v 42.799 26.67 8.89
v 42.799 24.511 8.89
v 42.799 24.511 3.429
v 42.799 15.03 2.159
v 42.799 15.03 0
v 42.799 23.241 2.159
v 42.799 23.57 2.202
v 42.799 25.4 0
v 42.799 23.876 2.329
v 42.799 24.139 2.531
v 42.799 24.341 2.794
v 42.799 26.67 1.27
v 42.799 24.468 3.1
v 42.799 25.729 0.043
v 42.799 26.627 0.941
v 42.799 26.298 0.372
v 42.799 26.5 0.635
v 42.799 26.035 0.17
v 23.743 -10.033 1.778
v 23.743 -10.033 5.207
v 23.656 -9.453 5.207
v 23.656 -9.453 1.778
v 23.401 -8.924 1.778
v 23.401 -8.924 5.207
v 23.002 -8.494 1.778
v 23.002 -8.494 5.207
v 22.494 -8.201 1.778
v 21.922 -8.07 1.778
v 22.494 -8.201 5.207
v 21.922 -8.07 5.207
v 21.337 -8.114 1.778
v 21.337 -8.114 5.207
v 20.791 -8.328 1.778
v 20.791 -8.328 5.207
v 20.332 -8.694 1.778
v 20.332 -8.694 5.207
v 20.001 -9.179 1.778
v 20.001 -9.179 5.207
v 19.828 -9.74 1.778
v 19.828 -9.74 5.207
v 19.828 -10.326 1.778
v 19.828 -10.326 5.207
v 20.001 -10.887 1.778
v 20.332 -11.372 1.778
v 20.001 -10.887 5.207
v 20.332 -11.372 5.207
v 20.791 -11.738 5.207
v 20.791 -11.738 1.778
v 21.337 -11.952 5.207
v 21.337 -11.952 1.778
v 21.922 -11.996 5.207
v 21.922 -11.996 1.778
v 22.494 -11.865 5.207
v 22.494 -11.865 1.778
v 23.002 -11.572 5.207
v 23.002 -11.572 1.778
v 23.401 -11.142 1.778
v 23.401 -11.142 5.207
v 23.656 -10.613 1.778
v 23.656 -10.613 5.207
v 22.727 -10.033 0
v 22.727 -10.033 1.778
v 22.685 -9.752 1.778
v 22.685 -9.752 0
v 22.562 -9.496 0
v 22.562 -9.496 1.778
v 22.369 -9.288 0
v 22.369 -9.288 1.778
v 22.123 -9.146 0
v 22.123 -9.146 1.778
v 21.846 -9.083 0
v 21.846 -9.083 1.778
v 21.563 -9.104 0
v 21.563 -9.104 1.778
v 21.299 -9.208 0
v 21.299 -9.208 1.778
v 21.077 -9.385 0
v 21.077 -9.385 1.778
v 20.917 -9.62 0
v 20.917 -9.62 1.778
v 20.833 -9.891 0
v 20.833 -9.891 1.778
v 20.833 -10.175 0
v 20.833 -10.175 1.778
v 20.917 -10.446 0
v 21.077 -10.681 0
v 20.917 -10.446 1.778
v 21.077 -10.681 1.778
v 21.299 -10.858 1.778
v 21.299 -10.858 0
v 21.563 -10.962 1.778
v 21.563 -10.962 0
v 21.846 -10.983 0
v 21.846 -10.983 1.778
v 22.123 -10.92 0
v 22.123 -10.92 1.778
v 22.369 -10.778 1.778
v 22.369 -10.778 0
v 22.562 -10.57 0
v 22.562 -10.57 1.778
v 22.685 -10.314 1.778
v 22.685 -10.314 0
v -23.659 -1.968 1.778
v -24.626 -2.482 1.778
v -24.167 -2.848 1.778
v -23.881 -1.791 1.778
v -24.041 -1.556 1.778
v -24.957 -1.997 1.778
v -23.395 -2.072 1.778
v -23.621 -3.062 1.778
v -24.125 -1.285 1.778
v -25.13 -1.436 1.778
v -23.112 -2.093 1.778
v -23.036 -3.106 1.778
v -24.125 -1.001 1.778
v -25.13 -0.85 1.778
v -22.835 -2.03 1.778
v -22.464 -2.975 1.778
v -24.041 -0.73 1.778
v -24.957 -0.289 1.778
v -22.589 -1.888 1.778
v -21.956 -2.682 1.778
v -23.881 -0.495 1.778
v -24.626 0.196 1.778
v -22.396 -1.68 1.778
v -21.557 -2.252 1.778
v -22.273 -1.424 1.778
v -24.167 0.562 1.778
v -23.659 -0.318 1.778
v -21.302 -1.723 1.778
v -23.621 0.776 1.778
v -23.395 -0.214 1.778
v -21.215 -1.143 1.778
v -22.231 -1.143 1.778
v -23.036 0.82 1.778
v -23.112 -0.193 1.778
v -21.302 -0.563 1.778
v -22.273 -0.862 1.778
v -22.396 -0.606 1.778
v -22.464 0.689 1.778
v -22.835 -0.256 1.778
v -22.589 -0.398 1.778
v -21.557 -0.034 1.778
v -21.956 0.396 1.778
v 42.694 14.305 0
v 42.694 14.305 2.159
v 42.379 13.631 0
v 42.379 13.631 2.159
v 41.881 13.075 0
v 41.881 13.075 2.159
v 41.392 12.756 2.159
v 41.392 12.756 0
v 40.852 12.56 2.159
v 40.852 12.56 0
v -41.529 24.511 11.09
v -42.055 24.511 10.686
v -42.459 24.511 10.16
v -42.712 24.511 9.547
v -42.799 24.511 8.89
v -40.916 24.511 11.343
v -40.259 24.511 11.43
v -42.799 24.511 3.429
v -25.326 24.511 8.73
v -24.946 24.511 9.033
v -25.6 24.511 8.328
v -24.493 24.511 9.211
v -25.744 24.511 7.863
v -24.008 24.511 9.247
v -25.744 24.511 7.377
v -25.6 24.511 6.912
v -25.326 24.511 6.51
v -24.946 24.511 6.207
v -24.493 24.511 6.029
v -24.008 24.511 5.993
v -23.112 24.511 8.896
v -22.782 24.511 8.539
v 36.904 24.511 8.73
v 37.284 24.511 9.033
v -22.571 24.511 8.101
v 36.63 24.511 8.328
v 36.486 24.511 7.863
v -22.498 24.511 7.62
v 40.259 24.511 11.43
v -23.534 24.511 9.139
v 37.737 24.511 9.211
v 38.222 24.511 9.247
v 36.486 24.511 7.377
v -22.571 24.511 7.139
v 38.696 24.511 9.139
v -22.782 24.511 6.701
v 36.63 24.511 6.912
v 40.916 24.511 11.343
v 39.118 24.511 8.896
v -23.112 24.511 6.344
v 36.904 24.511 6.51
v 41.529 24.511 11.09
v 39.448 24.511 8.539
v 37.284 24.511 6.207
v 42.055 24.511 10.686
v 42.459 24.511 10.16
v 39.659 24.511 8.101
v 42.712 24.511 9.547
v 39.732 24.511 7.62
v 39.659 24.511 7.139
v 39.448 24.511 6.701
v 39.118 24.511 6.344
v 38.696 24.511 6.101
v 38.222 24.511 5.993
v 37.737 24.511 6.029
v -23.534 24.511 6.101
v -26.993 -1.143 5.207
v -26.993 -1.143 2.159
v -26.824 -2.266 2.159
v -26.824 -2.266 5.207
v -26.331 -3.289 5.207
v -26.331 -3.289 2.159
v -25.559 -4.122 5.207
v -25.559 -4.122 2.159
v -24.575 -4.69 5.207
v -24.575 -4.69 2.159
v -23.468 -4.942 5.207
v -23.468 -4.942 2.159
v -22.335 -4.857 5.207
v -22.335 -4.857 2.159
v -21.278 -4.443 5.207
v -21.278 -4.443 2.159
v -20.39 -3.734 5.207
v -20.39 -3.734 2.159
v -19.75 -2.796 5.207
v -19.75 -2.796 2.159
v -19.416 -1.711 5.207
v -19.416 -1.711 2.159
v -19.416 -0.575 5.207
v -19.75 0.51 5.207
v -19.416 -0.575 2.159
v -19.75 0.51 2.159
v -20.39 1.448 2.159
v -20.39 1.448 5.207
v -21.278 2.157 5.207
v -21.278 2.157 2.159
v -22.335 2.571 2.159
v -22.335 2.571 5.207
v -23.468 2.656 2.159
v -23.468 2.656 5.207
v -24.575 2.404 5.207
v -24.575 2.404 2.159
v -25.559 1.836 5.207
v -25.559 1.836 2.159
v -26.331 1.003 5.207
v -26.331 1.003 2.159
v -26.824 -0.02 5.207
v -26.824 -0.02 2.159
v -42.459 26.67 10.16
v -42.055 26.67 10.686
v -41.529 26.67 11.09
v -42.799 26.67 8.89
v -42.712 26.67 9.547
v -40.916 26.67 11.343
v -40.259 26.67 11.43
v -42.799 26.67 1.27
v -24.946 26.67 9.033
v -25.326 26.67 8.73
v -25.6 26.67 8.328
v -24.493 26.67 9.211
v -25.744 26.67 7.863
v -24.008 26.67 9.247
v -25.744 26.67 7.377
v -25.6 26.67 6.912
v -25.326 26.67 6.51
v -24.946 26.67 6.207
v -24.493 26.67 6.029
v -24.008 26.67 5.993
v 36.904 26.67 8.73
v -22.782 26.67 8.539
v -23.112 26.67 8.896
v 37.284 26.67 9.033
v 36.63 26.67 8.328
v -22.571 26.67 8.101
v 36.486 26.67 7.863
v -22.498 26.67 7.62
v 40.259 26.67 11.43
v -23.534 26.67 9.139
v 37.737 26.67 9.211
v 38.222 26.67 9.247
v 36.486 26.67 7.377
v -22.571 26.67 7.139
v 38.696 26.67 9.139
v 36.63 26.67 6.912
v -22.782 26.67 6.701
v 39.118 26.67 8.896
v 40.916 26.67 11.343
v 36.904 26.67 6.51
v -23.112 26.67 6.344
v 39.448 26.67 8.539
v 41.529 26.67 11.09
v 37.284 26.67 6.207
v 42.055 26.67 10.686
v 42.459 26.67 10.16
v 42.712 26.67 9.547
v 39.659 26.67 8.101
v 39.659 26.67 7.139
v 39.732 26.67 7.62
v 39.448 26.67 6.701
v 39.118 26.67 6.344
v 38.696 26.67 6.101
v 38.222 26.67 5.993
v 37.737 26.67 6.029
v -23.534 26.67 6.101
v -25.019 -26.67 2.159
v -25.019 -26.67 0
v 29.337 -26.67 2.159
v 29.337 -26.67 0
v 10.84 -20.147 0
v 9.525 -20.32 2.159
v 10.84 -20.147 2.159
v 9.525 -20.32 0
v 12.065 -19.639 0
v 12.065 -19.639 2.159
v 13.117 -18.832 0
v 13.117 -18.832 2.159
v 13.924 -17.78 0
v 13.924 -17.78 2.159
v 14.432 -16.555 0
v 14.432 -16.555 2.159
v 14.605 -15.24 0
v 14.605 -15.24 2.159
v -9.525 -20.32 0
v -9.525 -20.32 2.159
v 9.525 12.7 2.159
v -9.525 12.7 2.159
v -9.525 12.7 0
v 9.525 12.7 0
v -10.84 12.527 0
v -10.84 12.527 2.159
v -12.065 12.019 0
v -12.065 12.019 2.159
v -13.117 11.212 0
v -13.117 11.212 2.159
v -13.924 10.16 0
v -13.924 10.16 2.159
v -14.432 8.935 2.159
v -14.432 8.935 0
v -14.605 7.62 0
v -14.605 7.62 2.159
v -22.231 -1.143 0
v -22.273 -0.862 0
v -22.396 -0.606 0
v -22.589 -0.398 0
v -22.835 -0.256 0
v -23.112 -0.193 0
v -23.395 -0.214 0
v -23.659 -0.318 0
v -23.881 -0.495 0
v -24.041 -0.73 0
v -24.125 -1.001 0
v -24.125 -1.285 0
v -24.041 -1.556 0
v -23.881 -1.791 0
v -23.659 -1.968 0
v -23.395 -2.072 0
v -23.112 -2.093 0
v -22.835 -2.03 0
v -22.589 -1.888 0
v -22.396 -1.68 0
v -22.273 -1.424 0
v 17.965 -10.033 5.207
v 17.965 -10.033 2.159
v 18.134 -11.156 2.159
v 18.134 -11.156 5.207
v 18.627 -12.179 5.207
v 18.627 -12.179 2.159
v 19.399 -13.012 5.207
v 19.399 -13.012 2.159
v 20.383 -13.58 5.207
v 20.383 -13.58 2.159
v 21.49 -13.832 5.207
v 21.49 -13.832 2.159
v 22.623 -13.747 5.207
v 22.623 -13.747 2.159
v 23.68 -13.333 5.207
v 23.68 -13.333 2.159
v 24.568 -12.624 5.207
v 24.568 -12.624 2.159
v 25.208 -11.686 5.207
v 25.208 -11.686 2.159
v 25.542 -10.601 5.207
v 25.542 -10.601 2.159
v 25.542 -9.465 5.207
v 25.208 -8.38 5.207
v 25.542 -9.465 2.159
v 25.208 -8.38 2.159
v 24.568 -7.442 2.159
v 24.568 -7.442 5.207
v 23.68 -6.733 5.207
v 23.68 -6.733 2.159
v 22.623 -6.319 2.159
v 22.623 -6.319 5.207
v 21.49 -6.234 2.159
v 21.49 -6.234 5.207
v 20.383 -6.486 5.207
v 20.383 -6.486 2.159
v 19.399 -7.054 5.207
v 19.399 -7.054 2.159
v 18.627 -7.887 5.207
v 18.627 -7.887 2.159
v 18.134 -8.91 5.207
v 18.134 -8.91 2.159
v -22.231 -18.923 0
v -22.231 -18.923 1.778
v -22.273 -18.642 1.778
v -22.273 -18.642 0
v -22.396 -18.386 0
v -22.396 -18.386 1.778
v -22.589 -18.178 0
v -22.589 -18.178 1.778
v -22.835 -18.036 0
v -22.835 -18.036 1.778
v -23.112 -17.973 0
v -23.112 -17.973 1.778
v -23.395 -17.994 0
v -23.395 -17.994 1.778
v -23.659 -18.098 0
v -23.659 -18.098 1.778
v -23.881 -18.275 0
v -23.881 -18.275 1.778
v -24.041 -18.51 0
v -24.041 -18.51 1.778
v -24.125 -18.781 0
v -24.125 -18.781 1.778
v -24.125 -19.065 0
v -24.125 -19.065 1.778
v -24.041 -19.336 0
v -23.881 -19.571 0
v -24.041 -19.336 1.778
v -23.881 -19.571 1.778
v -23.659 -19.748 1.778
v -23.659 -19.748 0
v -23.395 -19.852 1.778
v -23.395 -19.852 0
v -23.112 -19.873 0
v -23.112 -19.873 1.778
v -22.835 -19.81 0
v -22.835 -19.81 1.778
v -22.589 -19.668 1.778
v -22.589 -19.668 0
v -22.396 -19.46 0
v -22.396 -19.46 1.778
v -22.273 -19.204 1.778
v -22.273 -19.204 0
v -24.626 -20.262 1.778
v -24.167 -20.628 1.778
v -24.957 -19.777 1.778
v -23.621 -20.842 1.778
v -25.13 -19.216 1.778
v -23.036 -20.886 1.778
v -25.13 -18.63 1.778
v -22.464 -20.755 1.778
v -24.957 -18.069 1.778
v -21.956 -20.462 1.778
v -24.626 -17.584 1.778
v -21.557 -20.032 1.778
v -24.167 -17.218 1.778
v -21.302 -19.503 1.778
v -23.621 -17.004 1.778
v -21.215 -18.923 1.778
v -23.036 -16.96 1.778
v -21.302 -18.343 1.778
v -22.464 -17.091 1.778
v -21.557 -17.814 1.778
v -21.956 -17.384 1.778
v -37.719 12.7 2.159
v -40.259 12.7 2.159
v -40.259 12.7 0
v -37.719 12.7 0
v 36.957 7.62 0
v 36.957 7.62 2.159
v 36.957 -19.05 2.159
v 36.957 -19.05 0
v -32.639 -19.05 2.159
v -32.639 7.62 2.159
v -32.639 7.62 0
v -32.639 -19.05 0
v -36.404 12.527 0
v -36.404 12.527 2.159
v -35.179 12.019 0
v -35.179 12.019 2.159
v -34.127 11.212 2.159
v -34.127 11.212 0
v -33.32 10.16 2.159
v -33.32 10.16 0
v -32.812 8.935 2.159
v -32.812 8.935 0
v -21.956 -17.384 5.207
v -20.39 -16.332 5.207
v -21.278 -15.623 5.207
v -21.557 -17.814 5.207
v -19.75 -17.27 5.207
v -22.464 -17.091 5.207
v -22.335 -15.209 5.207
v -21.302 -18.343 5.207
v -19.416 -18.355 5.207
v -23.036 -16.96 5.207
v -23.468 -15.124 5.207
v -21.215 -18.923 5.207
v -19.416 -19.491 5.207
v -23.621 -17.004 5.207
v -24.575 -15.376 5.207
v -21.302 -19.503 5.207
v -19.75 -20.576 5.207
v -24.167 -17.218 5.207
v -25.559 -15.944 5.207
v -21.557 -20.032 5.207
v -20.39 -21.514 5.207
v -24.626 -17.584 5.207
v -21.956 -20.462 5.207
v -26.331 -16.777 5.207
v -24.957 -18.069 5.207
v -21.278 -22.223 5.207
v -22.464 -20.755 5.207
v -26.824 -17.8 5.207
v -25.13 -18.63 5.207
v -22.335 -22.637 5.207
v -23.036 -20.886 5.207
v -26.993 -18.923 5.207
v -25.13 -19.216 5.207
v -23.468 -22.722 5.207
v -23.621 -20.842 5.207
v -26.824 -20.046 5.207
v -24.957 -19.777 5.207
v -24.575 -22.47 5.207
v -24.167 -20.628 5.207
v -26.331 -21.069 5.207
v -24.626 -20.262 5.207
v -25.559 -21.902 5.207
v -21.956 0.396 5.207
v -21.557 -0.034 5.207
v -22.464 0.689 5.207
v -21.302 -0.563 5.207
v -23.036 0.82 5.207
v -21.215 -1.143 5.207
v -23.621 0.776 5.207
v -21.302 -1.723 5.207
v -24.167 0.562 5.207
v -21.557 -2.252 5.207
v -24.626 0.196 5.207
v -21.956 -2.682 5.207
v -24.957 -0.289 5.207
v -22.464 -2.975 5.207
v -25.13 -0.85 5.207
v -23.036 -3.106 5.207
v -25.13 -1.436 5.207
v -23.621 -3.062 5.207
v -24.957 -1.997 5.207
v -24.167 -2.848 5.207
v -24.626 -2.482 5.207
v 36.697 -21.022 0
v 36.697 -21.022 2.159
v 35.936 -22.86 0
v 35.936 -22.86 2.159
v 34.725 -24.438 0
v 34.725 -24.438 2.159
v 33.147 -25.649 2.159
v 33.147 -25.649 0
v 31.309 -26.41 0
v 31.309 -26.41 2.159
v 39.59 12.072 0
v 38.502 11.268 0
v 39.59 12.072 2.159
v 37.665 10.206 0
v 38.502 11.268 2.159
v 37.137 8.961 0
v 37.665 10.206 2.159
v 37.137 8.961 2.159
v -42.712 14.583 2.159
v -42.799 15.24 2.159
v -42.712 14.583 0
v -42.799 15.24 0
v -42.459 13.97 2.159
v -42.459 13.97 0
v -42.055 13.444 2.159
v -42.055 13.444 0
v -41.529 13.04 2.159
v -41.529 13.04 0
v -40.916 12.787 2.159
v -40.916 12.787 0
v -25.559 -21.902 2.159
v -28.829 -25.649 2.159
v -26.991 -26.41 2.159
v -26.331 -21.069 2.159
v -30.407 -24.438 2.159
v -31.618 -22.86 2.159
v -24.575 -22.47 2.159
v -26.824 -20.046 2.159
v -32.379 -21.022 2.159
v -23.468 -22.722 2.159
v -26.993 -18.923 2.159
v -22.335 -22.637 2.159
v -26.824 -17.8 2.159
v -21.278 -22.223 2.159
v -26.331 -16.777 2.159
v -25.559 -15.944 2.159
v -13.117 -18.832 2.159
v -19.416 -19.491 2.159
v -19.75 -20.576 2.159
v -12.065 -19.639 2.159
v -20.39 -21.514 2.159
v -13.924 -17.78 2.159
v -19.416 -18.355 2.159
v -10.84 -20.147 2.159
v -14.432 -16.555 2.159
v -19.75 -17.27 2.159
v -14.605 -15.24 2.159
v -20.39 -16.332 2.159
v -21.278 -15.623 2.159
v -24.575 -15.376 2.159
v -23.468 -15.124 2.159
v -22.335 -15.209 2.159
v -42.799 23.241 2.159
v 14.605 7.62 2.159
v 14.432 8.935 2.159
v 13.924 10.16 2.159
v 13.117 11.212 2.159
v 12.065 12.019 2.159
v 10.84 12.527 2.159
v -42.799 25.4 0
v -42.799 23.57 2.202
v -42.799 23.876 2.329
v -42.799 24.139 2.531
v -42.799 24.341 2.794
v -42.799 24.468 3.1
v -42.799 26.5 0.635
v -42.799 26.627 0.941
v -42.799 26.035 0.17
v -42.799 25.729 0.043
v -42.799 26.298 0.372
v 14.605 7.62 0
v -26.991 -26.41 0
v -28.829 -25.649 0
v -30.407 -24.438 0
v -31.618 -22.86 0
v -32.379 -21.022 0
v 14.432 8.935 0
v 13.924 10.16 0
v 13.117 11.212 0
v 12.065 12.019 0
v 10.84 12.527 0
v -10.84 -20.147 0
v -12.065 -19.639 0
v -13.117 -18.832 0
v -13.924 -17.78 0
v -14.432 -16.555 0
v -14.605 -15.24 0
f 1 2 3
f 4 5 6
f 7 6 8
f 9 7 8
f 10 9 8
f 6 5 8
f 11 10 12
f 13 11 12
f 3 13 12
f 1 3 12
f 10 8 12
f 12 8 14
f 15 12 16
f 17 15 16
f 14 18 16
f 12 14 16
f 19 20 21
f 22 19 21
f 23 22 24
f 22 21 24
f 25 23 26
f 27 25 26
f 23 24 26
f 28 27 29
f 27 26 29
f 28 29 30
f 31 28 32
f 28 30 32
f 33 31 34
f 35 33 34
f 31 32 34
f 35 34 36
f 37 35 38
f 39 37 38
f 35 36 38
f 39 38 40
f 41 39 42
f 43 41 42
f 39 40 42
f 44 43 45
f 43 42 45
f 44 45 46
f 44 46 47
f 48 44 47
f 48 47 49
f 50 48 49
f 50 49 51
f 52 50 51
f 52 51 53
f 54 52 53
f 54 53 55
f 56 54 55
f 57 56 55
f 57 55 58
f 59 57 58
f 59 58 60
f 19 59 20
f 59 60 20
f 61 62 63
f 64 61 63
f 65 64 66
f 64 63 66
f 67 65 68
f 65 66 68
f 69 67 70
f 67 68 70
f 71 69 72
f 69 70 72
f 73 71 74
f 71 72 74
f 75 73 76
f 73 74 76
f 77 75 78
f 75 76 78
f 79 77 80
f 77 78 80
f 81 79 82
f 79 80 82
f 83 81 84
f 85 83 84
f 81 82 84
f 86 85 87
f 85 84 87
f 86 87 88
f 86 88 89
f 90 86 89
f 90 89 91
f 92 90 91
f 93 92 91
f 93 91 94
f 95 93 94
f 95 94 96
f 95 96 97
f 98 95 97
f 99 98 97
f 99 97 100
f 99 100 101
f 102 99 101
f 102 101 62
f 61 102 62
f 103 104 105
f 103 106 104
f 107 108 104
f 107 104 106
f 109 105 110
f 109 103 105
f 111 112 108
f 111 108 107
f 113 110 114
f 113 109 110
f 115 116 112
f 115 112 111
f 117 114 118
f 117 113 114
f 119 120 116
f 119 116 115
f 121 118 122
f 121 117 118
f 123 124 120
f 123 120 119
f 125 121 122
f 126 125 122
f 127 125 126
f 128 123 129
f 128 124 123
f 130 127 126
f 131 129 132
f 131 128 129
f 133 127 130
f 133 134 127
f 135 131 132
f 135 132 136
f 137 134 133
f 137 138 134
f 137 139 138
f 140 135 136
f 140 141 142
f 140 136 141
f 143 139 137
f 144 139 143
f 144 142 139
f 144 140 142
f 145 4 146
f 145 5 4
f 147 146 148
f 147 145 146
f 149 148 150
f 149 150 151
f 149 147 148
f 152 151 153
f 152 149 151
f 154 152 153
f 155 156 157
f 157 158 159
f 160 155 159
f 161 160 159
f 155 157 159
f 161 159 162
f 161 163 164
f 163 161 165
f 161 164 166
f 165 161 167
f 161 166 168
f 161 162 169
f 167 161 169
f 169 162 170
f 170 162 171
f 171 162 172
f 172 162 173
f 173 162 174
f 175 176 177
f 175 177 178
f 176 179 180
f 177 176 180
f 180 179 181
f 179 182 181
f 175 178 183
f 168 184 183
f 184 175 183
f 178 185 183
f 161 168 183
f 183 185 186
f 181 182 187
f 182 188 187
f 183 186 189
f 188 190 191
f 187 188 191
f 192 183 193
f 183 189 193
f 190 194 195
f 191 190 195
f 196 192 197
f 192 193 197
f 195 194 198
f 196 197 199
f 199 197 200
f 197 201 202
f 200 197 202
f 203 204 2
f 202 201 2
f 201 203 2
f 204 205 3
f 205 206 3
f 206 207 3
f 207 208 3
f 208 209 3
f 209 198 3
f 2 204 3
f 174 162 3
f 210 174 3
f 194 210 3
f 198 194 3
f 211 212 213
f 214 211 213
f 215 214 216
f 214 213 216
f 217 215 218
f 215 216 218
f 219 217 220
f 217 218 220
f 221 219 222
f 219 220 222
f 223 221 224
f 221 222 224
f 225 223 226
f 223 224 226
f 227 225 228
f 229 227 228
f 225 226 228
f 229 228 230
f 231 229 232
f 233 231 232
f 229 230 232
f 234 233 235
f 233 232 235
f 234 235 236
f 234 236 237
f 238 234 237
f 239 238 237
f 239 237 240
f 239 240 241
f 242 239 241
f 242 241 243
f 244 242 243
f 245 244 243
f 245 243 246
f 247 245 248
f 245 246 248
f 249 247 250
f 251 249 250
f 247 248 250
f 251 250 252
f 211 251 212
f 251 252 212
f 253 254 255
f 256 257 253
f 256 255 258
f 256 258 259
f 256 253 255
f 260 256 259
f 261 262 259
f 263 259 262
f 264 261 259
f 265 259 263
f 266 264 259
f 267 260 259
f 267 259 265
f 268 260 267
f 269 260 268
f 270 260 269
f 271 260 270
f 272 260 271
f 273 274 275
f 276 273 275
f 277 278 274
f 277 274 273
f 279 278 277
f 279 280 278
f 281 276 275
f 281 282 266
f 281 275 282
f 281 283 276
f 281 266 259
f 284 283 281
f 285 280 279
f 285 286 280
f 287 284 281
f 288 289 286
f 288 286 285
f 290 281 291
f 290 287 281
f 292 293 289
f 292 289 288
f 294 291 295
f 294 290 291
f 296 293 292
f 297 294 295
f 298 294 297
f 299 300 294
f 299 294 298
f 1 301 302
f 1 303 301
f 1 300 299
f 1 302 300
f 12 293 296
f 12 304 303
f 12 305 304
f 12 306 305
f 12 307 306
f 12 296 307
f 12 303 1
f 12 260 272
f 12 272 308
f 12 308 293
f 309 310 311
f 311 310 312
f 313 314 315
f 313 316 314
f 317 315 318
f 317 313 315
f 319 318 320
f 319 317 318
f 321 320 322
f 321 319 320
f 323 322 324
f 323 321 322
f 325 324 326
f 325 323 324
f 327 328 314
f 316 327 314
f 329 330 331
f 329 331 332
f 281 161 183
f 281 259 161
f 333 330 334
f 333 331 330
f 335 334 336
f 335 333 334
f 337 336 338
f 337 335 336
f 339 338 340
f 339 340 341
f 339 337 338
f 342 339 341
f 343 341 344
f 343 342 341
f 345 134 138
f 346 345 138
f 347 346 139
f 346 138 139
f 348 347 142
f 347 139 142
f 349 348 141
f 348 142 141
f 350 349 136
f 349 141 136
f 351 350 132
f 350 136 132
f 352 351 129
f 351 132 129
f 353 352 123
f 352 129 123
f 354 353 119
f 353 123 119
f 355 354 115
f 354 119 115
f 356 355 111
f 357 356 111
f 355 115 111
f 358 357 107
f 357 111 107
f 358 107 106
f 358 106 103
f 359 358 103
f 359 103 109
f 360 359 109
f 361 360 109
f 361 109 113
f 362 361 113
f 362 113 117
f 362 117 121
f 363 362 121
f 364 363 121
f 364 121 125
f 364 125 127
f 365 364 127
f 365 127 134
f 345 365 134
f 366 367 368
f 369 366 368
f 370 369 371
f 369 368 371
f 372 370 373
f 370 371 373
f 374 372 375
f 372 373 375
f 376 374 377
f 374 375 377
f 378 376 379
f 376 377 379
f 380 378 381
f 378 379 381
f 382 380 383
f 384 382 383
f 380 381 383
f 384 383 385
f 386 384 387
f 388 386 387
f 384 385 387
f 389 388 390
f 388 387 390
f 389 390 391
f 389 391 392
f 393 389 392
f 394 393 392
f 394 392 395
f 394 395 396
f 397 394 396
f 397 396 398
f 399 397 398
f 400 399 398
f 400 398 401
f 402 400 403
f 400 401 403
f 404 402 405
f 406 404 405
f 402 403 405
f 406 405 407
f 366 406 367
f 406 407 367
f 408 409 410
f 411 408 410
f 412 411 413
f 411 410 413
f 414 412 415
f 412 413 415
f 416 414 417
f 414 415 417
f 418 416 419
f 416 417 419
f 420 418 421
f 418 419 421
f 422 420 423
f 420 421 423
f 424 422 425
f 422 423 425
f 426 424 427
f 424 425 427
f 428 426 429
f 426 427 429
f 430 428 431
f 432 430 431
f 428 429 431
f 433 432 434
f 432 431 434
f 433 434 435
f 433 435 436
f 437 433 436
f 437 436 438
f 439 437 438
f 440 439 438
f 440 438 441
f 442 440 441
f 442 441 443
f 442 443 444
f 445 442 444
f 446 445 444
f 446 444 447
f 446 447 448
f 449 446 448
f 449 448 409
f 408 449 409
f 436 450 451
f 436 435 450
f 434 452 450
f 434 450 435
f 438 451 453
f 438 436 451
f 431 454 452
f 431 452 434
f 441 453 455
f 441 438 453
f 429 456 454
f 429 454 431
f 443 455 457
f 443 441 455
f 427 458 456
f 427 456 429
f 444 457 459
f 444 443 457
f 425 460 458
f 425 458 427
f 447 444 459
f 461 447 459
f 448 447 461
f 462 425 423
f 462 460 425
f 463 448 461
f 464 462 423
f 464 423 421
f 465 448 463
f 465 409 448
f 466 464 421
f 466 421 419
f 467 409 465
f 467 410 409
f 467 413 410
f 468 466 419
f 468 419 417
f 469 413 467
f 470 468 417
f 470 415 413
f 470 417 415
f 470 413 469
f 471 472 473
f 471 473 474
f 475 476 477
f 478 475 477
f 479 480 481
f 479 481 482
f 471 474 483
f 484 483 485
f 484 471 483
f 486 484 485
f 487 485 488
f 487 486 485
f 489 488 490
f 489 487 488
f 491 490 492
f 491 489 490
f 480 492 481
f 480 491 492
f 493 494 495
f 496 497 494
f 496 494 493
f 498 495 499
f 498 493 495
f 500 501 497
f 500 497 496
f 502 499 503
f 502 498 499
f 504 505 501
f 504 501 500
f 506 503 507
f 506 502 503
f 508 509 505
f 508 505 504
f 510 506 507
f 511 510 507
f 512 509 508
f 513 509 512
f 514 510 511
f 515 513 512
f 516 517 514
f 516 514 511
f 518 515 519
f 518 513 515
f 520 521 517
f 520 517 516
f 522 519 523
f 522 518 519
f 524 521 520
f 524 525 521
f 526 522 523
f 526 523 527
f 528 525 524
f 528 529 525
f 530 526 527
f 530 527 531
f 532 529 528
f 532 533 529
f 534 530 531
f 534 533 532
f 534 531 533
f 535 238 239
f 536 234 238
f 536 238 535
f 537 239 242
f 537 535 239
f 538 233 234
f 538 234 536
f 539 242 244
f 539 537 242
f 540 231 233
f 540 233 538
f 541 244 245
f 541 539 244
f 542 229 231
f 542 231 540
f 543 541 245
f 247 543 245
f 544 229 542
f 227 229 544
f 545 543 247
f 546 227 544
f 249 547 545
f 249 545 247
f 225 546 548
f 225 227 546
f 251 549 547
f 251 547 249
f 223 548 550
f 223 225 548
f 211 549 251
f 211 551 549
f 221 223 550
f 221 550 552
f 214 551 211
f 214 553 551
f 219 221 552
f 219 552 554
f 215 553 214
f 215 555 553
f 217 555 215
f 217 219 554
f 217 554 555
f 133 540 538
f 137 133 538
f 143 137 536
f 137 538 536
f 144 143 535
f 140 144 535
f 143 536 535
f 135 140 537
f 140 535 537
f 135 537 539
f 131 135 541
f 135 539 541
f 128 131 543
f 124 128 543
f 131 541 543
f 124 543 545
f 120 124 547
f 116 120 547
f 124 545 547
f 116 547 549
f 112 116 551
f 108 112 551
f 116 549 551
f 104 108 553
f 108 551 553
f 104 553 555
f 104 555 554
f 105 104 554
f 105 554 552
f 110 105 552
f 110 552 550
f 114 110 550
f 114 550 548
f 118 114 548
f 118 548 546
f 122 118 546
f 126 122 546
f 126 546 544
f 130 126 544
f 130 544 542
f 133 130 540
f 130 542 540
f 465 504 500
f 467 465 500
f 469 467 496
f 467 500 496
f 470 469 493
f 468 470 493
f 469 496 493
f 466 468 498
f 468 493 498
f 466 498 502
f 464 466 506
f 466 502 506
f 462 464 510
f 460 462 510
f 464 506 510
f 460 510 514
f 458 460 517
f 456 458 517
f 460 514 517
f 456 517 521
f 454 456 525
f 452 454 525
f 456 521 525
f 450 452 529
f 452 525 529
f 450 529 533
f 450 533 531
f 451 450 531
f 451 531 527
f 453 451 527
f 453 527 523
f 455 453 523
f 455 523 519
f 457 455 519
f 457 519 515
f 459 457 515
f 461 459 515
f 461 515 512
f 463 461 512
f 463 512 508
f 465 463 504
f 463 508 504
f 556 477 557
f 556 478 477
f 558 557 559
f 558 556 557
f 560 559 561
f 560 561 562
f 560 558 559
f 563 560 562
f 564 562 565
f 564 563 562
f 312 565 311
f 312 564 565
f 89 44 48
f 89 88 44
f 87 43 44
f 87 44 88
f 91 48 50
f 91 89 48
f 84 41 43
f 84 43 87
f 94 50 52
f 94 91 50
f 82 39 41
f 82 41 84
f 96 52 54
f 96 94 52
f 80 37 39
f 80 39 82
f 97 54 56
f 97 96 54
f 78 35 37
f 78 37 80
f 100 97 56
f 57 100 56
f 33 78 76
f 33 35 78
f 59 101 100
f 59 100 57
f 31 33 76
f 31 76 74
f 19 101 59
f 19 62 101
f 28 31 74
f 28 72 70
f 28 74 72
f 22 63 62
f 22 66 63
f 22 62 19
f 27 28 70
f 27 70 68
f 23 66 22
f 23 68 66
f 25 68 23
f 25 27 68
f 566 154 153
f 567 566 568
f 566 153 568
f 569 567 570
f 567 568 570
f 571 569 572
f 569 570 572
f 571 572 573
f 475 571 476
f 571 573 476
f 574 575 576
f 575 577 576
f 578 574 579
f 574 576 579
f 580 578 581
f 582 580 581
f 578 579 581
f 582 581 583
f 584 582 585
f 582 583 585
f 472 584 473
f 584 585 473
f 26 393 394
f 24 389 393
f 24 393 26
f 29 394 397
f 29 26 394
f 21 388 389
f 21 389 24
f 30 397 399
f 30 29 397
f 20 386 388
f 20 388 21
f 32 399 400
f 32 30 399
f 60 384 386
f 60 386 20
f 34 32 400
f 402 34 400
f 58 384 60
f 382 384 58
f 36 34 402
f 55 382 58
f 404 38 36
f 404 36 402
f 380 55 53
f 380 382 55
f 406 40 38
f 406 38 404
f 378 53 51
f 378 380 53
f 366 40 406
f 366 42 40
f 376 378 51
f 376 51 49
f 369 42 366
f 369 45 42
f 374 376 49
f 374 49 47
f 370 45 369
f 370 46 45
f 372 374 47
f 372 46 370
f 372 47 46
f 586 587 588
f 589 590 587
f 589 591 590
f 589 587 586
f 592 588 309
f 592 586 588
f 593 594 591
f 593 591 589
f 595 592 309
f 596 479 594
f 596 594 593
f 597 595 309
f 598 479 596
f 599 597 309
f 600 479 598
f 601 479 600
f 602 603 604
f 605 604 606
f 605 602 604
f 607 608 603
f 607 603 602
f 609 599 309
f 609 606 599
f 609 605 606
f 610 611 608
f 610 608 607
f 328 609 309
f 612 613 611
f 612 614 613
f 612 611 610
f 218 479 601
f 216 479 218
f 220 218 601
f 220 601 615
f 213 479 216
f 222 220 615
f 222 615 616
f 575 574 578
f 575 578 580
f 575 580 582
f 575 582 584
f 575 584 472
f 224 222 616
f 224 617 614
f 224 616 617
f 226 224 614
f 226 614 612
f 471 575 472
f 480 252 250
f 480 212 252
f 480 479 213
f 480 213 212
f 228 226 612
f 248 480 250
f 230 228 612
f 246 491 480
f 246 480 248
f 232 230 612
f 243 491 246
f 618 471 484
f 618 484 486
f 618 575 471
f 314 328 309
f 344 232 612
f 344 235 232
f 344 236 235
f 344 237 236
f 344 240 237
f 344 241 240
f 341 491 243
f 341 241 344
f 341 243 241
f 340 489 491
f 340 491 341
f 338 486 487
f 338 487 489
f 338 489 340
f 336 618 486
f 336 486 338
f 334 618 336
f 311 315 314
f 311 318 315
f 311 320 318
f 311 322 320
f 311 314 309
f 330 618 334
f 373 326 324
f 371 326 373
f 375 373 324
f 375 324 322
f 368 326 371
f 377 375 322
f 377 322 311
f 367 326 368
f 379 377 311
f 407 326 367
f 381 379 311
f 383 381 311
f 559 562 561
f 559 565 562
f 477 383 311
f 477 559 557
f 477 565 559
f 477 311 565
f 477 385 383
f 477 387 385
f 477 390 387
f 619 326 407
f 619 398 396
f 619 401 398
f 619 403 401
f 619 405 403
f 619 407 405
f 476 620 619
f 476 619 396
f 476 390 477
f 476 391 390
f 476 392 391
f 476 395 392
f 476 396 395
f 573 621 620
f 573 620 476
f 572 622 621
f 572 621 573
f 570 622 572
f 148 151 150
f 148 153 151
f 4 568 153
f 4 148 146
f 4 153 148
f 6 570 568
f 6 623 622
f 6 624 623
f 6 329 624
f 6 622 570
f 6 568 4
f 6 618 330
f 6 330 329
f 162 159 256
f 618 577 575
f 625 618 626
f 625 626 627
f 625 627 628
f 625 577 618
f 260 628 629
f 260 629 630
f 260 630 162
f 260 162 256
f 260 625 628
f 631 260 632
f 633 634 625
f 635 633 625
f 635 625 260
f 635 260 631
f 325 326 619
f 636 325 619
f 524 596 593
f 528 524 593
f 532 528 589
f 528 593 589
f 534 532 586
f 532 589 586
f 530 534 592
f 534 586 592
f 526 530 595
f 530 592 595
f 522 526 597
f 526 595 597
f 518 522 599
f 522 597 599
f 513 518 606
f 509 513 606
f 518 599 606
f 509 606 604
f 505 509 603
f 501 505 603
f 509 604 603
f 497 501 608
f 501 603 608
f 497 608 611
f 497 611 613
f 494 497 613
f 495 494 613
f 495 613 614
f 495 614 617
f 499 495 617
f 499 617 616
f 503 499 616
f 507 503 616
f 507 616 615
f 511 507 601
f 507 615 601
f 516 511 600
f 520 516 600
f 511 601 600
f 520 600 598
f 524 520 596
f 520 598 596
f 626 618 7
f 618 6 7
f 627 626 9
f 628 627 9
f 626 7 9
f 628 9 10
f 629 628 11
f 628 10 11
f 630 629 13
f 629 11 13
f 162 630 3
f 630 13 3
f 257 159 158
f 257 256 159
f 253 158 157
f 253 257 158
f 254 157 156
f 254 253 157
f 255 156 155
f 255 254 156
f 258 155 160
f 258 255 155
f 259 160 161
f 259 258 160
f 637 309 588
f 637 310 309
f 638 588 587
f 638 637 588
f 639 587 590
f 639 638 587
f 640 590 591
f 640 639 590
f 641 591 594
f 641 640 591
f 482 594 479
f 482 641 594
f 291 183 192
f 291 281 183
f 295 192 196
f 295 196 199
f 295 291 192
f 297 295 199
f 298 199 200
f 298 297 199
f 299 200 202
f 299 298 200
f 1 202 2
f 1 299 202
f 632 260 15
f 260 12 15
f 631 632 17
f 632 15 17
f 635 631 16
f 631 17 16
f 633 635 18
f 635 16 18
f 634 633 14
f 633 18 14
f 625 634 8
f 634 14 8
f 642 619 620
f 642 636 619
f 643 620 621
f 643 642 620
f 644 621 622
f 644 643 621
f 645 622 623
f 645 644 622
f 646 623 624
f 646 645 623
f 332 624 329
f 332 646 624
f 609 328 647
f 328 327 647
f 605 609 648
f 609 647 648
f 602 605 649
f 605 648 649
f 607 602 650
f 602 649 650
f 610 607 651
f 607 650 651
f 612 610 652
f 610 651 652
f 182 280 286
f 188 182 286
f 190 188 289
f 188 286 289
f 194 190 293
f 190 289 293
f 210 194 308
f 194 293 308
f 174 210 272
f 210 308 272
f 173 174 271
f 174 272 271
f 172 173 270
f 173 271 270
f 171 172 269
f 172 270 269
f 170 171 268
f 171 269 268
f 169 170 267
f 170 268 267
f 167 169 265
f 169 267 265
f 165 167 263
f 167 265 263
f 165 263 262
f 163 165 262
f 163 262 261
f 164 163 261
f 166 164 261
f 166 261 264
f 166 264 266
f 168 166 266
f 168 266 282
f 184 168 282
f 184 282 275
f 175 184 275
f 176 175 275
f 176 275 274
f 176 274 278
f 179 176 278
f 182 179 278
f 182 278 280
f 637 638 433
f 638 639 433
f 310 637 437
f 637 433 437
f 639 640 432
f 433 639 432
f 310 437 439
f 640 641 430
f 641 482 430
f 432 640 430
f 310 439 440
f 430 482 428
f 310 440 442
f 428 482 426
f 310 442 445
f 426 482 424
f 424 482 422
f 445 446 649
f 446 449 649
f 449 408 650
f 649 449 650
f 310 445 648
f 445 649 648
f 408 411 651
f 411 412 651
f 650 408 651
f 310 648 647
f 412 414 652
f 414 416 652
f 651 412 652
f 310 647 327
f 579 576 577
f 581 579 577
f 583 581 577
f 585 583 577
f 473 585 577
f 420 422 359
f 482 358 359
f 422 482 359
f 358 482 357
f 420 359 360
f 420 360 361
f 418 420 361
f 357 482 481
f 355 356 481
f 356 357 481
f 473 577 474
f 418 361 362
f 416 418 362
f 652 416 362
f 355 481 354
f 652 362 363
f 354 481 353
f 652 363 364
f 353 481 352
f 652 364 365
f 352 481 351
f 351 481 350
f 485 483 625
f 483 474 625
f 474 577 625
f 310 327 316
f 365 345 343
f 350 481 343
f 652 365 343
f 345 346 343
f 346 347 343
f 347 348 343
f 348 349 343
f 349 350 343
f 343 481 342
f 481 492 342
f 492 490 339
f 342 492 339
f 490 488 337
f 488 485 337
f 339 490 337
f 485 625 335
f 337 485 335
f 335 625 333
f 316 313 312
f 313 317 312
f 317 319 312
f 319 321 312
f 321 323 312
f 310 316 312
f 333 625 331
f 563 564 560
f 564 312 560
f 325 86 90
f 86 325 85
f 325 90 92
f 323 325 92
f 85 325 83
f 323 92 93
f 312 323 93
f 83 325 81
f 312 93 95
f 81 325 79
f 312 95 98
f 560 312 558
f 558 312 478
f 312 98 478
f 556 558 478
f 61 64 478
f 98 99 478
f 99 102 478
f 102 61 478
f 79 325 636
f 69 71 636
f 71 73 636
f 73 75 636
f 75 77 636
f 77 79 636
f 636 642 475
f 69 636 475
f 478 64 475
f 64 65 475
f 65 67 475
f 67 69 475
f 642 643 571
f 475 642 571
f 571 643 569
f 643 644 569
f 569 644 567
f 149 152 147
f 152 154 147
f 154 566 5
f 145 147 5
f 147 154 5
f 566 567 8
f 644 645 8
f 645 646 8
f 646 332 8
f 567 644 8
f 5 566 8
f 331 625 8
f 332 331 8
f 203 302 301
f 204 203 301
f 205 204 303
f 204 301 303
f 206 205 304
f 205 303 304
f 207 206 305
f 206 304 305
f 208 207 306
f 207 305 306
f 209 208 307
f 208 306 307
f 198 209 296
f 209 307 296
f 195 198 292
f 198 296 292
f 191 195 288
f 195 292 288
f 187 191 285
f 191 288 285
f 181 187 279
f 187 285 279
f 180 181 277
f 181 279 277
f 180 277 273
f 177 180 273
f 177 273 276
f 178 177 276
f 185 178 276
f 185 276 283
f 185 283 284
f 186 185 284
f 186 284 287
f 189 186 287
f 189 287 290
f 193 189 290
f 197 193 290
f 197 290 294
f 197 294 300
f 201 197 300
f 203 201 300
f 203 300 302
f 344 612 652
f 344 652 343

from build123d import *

# Parameters (mm, degrees)
SKETCH1_W             = 85.598
SKETCH1_H             = 53.34
BOSS_EXTRUDE1_DEPTH   = 2.159
SKETCH2_W             = 85.598
SKETCH2_H             = 2.159
BOSS_EXTRUDE2_DEPTH   = 9.271
FILLET1_R             = 1.27
FILLET2_R             = 1.27
FILLET3_R             = 2.54
SKETCH3_W             = 29.21
SKETCH3_H             = 33.02
CUT_EXTRUDE1_DEPTH    = 52.273723699
FILLET5_R             = 5.08
F_4_CLEARANCE_HOLE1_D = 3.2639
SKETCH18_R            = 3.81
BOSS_EXTRUDE6_DEPTH   = 3.048
SKETCH19_R            = 1.9685
CUT_EXTRUDE7_DEPTH    = 3.429
SKETCH20_R            = 0.9525
CUT_EXTRUDE8_DEPTH    = 52.343981195
CUT_EXTRUDE9_DEPTH    = 52.273723699
FILLET6_R             = 2.54
FILLET7_R             = 7.62
CUT_EXTRUDE10_DEPTH   = 52.273723699
FILLET8_R             = 2.54
FILLET9_R             = 7.62


with BuildPart() as part:
    # Sketch1 → Boss-Extrude1 (new body)
    with BuildSketch(Plane.XY):
        Rectangle(SKETCH1_W, SKETCH1_H)
    extrude(amount=BOSS_EXTRUDE1_DEPTH)

    # Sketch2 → Boss-Extrude2 (add)
    with BuildSketch(Plane.XY.offset(2.159)):
        with Locations((0, 25.5905)):
            Rectangle(SKETCH2_W, SKETCH2_H)
    extrude(amount=BOSS_EXTRUDE2_DEPTH)

    # Fillet1
    fillet1_edges = [part.edges().sort_by_distance(p)[0] for p in [
        (0, 24.511, 2.159),
    ]]
    fillet(fillet1_edges, radius=FILLET1_R)

    # Fillet2
    fillet2_edges = [part.edges().sort_by_distance(p)[0] for p in [
        (0, 26.67, 0),
    ]]
    fillet(fillet2_edges, radius=FILLET2_R)

    # Fillet3
    fillet3_edges = [part.edges().sort_by_distance(p)[0] for p in [
        (42.799, 25.5905, 11.43),
        (-42.799, 25.5905, 11.43),
    ]]
    fillet(fillet3_edges, radius=FILLET3_R)

    # Sketch3 → Cut-Extrude1 (cut, through all)
    with BuildSketch(Plane.XY.offset(2.159)):
        with Locations((0, -3.81)):
            Rectangle(SKETCH3_W, SKETCH3_H)
    extrude(amount=-CUT_EXTRUDE1_DEPTH, mode=Mode.SUBTRACT)

    # Fillet5
    fillet5_edges = [part.edges().sort_by_distance(p)[0] for p in [
        (-14.605, -20.32, 1.0795),
        (-14.605, 12.7, 1.0795),
        (14.605, 12.7, 1.0795),
        (14.605, -20.32, 1.0795),
    ]]
    fillet(fillet5_edges, radius=FILLET5_R)

    # #4 Clearance Hole1 (through all)
    with Locations(Plane(origin=(0, 24.511, 0), x_dir=(-1, 0, 0), z_dir=(0, -1, 0))):
        with Locations((-38.1, -7.62), (24.13, -7.62)):
            Hole(F_4_CLEARANCE_HOLE1_D / 2)

    # Sketch18 → Boss-Extrude6 (add)
    with BuildSketch(Plane.XY.offset(2.159)):
        with Locations(Location((-23.18312986, -1.143, 0), (0, 0, 180))):
            Circle(SKETCH18_R)
        with Locations(Location((-23.18312986, -18.923, 0), (0, 0, 180))):
            Circle(SKETCH18_R)
        with Locations(Location((21.77487014, -10.033, 0), (0, 0, 180))):
            Circle(SKETCH18_R)
    extrude(amount=BOSS_EXTRUDE6_DEPTH)

    # Sketch19 → Cut-Extrude7 (cut)
    with BuildSketch(Plane.XY.offset(5.207)):
        with Locations((-23.18312986, -18.923)):
            Circle(SKETCH19_R)
        with Locations((21.77487014, -10.033)):
            Circle(SKETCH19_R)
        with Locations((-23.18312986, -1.143)):
            Circle(SKETCH19_R)
    extrude(amount=-CUT_EXTRUDE7_DEPTH, mode=Mode.SUBTRACT)

    # Sketch20 → Cut-Extrude8 (cut, through all)
    with BuildSketch(Plane.XY.offset(1.778)):
        with Locations((-23.18312986, -1.143)):
            Circle(SKETCH20_R)
        with Locations((-23.18312986, -18.923)):
            Circle(SKETCH20_R)
        with Locations((21.77487014, -10.033)):
            Circle(SKETCH20_R)
    extrude(amount=-CUT_EXTRUDE8_DEPTH, mode=Mode.SUBTRACT)

    # Sketch21 → Cut-Extrude9 (cut, through all)
    with BuildSketch(Plane.XY.offset(2.159)):
        with BuildLine():
            Line((-42.799, 12.7), (-37.719, 12.7))
            ThreePointArc((-37.719, 12.7), (-34.126897552, 11.212102448), (-32.639, 7.62))
            Line((-32.639, 7.62), (-32.639, -26.67))
            Line((-32.639, -26.67), (-42.799, -26.67))
            Line((-42.799, -26.67), (-42.799, 12.7))
        make_face()
    extrude(amount=-CUT_EXTRUDE9_DEPTH, mode=Mode.SUBTRACT)

    # Fillet6
    fillet6_edges = [part.edges().sort_by_distance(p)[0] for p in [
        (-42.799, 12.7, 1.0795),
    ]]
    fillet(fillet6_edges, radius=FILLET6_R)

    # Fillet7
    fillet7_edges = [part.edges().sort_by_distance(p)[0] for p in [
        (-32.639, -26.67, 1.0795),
    ]]
    fillet(fillet7_edges, radius=FILLET7_R)

    # Sketch22 → Cut-Extrude10 (cut, through all)
    with BuildSketch(Plane.XY.offset(2.159)):
        with BuildLine():
            Line((42.799, 12.7), (42.037, 12.7))
            ThreePointArc((42.037, 12.7), (38.444897552, 11.212102448), (36.957, 7.62))
            Line((36.957, 7.62), (36.957, -26.67))
            Line((36.957, -26.67), (42.799, -26.67))
            Line((42.799, -26.67), (42.799, 12.7))
        make_face()
    extrude(amount=-CUT_EXTRUDE10_DEPTH, mode=Mode.SUBTRACT)

    # Fillet8
    fillet8_edges = [part.edges().sort_by_distance(p)[0] for p in [
        (42.799, 12.7, 1.0795),
    ]]
    fillet(fillet8_edges, radius=FILLET8_R)

    # Fillet9
    fillet9_edges = [part.edges().sort_by_distance(p)[0] for p in [
        (36.957, -26.67, 1.0795),
    ]]
    fillet(fillet9_edges, radius=FILLET9_R)


solid = part.part
